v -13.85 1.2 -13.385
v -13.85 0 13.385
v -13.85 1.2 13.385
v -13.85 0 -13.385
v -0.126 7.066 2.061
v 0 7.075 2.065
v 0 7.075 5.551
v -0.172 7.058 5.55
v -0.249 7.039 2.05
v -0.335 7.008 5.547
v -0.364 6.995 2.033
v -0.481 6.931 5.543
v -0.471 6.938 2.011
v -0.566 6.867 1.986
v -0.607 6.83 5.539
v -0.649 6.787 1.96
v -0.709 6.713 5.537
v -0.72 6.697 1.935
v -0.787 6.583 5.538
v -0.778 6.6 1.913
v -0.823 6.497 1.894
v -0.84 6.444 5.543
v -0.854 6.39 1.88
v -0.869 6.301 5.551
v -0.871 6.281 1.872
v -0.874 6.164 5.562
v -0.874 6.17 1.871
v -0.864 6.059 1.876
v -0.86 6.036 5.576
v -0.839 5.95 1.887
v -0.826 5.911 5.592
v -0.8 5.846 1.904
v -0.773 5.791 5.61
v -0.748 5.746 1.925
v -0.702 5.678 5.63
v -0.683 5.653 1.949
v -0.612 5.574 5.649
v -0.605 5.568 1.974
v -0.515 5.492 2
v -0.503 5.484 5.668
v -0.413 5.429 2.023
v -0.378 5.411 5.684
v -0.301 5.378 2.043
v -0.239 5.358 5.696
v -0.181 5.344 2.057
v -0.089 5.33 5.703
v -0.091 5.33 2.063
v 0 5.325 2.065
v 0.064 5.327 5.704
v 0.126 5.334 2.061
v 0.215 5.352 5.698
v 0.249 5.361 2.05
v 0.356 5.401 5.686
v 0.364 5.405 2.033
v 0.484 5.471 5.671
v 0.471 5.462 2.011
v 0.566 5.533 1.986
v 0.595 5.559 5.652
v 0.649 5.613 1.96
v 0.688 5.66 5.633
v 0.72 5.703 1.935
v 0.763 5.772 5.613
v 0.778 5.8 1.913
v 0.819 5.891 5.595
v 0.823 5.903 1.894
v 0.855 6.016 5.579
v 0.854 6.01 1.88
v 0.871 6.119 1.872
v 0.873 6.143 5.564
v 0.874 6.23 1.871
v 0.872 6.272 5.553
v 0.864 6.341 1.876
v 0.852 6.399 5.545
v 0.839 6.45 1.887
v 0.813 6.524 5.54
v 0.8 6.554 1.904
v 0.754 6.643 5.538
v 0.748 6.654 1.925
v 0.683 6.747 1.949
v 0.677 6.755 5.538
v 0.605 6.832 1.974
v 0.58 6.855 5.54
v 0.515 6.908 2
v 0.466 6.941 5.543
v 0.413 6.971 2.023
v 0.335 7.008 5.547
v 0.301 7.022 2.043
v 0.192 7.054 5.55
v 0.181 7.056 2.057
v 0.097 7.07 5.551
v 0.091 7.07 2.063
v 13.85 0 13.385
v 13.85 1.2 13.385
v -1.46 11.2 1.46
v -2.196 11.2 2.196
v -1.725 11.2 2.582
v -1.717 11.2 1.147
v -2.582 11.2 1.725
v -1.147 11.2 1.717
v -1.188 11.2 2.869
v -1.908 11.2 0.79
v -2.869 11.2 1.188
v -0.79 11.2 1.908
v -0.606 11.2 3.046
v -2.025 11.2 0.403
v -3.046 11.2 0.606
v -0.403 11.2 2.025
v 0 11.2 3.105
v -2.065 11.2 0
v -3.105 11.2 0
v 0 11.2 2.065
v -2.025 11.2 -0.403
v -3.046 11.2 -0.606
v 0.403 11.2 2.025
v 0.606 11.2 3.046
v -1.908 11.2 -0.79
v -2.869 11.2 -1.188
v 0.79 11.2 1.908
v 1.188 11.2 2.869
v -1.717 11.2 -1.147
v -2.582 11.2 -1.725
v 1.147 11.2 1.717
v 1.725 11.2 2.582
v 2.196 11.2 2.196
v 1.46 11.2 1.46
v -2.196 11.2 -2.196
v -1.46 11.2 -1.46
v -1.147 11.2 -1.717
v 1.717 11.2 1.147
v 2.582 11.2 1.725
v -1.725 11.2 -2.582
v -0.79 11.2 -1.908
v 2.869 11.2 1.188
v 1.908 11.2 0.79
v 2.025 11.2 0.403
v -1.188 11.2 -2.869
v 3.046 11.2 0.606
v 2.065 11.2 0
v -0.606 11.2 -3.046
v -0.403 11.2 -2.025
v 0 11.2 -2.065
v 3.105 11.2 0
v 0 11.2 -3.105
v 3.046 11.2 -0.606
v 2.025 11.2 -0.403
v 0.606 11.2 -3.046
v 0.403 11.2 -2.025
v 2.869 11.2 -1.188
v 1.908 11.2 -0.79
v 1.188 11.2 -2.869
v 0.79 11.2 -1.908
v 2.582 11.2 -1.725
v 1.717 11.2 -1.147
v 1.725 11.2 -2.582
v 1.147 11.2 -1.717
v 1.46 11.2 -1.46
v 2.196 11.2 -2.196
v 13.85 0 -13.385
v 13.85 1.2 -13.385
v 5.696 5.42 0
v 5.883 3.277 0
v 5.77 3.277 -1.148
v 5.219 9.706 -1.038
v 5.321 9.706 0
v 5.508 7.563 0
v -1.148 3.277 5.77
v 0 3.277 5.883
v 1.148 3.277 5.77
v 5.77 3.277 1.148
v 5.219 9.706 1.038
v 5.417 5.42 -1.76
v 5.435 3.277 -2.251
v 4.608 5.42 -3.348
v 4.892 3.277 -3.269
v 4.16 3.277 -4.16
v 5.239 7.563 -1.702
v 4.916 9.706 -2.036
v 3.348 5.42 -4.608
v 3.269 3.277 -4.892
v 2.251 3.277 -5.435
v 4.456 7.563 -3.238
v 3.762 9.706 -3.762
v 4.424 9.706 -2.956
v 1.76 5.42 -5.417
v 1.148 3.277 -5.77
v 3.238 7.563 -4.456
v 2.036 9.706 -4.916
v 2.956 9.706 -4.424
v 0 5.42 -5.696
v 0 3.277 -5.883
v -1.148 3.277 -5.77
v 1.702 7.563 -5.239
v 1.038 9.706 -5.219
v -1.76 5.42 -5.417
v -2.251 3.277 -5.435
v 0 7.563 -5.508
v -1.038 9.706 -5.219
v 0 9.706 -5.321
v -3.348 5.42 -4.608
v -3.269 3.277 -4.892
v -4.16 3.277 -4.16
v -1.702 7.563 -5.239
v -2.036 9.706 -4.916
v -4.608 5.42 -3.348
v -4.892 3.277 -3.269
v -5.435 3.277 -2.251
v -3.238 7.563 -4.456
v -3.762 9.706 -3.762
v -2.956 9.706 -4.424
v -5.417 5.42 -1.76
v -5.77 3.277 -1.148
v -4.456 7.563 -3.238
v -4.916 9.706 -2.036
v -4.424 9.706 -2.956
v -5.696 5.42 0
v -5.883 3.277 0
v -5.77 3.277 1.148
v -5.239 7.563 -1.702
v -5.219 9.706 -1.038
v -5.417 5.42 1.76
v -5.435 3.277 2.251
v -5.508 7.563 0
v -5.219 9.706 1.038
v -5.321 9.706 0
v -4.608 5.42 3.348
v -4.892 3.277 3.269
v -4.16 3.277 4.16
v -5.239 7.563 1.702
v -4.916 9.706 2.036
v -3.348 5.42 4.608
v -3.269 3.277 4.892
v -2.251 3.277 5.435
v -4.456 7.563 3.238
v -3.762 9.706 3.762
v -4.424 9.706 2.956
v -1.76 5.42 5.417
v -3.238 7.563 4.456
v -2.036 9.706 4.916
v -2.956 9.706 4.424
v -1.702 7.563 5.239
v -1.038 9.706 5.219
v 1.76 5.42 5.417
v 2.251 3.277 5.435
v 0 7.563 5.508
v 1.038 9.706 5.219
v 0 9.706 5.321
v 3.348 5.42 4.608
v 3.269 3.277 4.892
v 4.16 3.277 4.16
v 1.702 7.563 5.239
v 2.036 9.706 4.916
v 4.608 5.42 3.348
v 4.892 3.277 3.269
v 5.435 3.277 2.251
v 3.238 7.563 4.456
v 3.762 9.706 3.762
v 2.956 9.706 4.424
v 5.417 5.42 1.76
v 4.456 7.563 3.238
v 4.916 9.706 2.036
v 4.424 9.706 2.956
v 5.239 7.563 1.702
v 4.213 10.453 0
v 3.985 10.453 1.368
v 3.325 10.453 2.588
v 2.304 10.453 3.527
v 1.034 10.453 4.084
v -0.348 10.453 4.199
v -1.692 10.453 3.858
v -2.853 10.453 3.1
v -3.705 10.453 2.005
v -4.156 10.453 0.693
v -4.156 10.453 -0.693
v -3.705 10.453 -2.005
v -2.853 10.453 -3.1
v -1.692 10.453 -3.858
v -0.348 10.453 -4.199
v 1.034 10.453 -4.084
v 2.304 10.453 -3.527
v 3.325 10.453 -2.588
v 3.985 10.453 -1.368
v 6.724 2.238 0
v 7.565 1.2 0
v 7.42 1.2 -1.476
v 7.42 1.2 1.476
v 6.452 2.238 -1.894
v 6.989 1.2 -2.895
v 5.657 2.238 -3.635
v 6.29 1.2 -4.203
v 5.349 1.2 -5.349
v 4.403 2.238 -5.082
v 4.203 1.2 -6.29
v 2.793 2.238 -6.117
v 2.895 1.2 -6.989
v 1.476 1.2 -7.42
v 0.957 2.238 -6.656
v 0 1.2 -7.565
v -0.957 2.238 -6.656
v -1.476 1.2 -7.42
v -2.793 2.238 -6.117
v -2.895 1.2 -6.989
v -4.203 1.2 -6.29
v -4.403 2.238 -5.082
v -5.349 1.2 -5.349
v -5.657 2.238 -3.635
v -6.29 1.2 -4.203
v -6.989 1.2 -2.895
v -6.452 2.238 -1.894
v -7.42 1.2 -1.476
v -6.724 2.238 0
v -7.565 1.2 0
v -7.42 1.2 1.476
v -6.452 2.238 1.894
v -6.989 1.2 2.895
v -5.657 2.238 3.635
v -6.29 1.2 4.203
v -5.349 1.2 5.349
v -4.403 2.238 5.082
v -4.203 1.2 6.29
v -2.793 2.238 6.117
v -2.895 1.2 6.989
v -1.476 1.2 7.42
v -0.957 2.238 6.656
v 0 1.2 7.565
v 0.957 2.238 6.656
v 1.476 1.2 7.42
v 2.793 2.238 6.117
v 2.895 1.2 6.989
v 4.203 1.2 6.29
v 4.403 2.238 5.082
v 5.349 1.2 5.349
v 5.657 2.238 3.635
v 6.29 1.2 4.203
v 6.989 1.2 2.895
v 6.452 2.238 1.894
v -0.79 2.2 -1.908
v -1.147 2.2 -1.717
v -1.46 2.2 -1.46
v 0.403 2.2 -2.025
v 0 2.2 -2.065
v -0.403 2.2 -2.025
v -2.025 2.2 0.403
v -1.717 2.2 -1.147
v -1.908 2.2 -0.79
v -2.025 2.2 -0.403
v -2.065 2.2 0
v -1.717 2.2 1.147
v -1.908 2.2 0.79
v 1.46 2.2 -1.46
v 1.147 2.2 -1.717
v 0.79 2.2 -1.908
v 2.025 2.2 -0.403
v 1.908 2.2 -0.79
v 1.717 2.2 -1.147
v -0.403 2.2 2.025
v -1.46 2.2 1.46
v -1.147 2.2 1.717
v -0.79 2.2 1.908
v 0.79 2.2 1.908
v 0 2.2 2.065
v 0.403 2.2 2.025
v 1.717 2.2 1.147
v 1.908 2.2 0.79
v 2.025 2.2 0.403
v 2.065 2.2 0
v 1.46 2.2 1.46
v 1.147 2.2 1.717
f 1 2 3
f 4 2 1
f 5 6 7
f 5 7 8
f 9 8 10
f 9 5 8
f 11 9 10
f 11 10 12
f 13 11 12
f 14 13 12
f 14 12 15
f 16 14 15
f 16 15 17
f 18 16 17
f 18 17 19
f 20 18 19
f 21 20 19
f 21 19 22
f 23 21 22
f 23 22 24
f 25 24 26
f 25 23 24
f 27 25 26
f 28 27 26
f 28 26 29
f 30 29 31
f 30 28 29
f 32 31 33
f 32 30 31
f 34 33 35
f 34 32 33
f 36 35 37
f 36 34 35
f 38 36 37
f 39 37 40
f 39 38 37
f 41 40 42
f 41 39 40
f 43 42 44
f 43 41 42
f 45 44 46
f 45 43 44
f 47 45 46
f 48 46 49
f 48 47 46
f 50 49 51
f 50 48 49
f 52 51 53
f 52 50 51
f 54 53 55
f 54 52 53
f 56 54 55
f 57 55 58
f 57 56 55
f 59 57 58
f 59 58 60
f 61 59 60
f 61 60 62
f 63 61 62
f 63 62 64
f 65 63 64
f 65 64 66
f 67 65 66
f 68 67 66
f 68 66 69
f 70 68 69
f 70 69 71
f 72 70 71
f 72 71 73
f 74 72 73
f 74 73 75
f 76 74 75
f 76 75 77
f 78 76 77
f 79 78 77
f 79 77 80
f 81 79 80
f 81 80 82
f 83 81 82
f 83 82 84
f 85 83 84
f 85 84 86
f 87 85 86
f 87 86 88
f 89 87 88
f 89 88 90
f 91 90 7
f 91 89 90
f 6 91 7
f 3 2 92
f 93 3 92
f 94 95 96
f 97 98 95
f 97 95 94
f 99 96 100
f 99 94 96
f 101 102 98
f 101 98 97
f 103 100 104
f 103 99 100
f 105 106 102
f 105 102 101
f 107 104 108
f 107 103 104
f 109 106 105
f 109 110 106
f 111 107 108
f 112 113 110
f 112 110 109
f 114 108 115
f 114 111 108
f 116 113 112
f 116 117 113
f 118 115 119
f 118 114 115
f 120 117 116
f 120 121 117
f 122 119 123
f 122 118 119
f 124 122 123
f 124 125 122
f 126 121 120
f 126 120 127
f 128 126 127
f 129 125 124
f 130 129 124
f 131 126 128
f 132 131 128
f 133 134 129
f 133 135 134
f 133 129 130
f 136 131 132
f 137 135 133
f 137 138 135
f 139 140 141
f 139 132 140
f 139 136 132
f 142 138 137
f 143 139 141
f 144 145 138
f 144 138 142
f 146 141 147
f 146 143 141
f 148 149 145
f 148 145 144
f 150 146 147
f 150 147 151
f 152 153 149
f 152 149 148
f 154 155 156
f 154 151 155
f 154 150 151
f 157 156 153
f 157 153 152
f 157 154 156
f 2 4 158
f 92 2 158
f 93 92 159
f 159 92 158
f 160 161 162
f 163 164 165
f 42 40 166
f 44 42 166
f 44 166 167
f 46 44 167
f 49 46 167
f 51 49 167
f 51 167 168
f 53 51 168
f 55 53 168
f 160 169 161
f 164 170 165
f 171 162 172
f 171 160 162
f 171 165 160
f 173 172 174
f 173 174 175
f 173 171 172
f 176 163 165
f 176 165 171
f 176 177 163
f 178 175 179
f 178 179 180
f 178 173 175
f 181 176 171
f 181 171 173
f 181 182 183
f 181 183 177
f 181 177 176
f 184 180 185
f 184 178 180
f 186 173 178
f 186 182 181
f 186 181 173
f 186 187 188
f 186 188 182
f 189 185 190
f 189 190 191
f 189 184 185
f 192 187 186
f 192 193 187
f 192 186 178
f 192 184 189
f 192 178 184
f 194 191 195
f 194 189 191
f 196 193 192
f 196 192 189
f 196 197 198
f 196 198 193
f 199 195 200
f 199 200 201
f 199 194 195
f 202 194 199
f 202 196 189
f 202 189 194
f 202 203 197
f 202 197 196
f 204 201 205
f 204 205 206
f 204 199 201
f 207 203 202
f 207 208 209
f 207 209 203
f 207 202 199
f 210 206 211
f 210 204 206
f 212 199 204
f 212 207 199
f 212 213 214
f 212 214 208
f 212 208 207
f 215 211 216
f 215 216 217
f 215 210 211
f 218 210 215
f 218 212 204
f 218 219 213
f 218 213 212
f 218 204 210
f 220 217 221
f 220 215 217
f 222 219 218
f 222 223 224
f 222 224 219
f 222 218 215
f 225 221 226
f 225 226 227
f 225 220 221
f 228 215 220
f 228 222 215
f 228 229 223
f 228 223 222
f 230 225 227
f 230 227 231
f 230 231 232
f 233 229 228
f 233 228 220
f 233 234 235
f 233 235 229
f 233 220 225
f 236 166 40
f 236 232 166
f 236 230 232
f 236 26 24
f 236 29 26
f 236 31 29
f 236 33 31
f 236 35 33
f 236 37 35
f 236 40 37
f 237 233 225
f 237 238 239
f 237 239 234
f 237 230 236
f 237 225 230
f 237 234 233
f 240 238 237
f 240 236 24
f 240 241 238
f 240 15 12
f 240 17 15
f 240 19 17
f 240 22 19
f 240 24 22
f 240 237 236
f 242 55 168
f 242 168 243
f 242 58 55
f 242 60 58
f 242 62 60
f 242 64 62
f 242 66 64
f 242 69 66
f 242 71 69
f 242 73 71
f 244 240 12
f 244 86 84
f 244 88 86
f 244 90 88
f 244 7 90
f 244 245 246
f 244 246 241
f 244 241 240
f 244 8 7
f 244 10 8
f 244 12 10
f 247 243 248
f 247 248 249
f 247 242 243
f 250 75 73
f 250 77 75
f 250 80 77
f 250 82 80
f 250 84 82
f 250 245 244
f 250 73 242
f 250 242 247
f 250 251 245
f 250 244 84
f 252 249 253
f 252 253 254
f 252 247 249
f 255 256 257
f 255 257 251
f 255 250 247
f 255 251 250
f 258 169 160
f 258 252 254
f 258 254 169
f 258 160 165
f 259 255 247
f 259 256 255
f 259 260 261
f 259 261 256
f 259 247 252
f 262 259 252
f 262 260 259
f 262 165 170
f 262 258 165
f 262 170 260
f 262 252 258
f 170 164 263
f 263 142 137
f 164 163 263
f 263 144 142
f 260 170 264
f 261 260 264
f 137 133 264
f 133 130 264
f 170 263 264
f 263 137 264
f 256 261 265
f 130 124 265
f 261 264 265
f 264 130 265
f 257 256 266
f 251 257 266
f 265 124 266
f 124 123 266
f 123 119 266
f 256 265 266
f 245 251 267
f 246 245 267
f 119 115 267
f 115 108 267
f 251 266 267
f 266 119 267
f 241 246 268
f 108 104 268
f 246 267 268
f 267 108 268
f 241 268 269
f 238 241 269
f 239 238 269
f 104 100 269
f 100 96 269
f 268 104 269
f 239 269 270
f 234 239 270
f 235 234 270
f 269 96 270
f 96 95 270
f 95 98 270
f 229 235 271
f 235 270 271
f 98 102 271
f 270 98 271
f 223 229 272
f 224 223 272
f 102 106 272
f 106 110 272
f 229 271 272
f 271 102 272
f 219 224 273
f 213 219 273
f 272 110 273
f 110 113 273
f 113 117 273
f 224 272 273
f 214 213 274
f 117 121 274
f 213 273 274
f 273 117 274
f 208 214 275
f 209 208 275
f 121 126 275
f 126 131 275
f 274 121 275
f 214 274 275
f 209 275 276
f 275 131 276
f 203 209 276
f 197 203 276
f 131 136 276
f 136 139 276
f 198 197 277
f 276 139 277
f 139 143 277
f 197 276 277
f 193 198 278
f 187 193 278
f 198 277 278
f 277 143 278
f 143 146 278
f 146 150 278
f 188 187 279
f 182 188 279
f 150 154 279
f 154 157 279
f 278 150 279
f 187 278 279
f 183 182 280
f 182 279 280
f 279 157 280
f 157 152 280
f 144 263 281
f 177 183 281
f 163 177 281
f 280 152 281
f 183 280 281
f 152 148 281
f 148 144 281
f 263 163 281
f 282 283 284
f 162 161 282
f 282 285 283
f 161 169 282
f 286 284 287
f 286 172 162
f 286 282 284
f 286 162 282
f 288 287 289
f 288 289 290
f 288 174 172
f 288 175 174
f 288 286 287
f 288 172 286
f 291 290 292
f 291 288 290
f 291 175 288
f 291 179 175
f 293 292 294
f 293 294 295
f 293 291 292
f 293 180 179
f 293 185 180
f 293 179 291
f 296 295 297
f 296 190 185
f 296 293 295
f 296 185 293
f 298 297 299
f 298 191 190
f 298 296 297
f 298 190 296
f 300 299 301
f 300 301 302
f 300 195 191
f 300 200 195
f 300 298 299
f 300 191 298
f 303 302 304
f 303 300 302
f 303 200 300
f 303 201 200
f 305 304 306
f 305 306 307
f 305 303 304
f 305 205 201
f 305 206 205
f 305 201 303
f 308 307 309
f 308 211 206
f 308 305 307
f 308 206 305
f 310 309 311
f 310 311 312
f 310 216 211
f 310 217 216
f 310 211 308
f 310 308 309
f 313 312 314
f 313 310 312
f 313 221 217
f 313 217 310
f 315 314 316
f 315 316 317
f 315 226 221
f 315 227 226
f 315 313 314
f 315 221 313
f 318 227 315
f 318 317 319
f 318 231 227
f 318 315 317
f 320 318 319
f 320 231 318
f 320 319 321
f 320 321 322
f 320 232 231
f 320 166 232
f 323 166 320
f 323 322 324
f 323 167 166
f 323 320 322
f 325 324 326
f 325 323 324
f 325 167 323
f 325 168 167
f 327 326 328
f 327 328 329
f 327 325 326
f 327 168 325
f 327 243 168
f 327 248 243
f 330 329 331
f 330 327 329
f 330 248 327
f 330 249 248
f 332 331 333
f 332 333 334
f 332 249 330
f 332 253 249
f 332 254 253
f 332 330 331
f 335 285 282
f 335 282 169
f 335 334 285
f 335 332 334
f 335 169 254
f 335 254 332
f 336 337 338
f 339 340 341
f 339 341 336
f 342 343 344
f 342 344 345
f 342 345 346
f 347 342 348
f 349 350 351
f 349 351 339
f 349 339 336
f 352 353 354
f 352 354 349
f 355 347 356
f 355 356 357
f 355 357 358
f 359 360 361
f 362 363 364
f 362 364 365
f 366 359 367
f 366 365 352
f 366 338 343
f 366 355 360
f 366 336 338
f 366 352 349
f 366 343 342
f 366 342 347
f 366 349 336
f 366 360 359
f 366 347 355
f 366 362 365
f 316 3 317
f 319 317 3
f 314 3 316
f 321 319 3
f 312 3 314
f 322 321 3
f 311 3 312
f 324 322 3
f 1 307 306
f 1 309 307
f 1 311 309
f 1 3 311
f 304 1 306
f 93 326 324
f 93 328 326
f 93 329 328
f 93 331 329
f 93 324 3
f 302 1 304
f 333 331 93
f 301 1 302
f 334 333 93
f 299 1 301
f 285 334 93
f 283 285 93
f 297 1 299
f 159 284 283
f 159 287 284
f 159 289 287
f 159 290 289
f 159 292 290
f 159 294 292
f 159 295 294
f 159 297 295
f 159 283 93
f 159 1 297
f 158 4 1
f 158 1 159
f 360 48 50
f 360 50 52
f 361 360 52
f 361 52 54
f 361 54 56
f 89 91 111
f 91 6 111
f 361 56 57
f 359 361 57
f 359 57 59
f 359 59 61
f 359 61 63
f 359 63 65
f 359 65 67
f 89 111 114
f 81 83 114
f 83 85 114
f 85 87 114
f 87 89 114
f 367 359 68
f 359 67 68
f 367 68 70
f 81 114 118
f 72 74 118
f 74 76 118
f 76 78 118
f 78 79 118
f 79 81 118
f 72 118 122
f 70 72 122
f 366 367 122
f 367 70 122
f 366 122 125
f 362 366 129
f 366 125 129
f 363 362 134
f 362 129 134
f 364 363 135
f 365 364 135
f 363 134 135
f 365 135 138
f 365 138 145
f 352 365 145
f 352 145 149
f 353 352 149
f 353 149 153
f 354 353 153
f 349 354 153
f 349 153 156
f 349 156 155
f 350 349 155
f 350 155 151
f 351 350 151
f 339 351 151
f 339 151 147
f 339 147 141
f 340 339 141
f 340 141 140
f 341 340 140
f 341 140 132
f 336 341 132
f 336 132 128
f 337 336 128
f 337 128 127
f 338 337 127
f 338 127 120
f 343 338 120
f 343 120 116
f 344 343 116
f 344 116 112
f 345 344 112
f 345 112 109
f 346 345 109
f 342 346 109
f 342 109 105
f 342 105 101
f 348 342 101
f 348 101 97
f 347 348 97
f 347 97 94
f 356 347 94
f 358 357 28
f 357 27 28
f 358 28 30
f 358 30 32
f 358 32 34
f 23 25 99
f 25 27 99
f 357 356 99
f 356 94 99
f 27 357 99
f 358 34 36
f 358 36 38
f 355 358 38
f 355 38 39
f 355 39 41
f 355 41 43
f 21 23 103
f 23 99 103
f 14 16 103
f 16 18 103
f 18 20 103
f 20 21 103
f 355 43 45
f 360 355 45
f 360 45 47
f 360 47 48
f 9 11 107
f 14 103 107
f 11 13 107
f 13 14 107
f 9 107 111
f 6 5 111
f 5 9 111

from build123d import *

# Parameters (mm, degrees)
SKETCH1_W           = 27.7
SKETCH1_H           = 26.77
BOSS_EXTRUDE1_DEPTH = 1.2
SKETCH2_R           = 6.065
BOSS_EXTRUDE2_DEPTH = 10
BOSS_EXTRUDE2_TAPER = 5
SKETCH3_R           = 2.065
CUT_EXTRUDE1_DEPTH  = 9
CHAMFER1_SIZE       = 1.5
CHAMFER1_SIZE_2     = 2.084645451
SKETCH4_R           = 0.875
CUT_EXTRUDE2_DEPTH  = 9


with BuildPart() as part:
    # Sketch1 → Boss-Extrude1 (new body)
    with BuildSketch(Plane(origin=(0, 0, 0), x_dir=(1, 0, 0), z_dir=(0, 1, 0))):
        Rectangle(SKETCH1_W, SKETCH1_H)
    extrude(amount=BOSS_EXTRUDE1_DEPTH)

    # Sketch2 → Boss-Extrude2 (add)
    with BuildSketch(Plane(origin=(0, 1.2, 0), x_dir=(1, 0, 0), z_dir=(0, 1, 0))):
        Circle(SKETCH2_R)
    extrude(amount=BOSS_EXTRUDE2_DEPTH, taper=BOSS_EXTRUDE2_TAPER)

    # Sketch3 → Cut-Extrude1 (cut)
    with BuildSketch(Plane(origin=(0, 11.2, 0), x_dir=(1, 0, 0), z_dir=(0, 1, 0))):
        with Locations(Location((0, 0, 0), (0, 0, 270))):
            Circle(SKETCH3_R)
    extrude(amount=-CUT_EXTRUDE1_DEPTH, mode=Mode.SUBTRACT)

    # Chamfer1
    # the kernel refuses this chamfer: 2.084645451, 1.5 mm, written as the material it adds along each edge
    with BuildSketch(Plane(origin=(0, 1.2, 0), x_dir=(1, 0, 0), z_dir=(0, 0, 1))) as chamfer1_piece_1:
        Polygon((6.065 + CHAMFER1_SIZE, 0), (6.065 - CHAMFER1_SIZE_2 * 0.0871557427277, CHAMFER1_SIZE_2 * 0.996194697864), (6.065, 0), align=None)
    revolve(axis=Axis((0, 1.2, 0), (0, 1, 0)))
    # the kernel refuses this chamfer: 2.084645451, 1.5 mm, written as the material it takes off along each edge
    with BuildSketch(Plane(origin=(0, 11.2, 0), x_dir=(1, 0, 0), z_dir=(0, 0, -1))) as chamfer1_2_piece_1:
        Polygon((5.190113365 + CHAMFER1_SIZE * 0.0871557427477, CHAMFER1_SIZE * 0.996194698092), (5.190113365 - CHAMFER1_SIZE_2, 0), (5.190113365, 0), align=None)
    revolve(axis=Axis((0, 11.2, 0), (0, -1, 0)), mode=Mode.SUBTRACT)

    # Sketch4 → Cut-Extrude2 (cut)
    with BuildSketch(Plane.XY):
        with Locations(Location((0, 6.2, 0), (0, 0, 90.000000002))):
            Circle(SKETCH4_R)
    extrude(amount=CUT_EXTRUDE2_DEPTH, mode=Mode.SUBTRACT)


solid = part.part
